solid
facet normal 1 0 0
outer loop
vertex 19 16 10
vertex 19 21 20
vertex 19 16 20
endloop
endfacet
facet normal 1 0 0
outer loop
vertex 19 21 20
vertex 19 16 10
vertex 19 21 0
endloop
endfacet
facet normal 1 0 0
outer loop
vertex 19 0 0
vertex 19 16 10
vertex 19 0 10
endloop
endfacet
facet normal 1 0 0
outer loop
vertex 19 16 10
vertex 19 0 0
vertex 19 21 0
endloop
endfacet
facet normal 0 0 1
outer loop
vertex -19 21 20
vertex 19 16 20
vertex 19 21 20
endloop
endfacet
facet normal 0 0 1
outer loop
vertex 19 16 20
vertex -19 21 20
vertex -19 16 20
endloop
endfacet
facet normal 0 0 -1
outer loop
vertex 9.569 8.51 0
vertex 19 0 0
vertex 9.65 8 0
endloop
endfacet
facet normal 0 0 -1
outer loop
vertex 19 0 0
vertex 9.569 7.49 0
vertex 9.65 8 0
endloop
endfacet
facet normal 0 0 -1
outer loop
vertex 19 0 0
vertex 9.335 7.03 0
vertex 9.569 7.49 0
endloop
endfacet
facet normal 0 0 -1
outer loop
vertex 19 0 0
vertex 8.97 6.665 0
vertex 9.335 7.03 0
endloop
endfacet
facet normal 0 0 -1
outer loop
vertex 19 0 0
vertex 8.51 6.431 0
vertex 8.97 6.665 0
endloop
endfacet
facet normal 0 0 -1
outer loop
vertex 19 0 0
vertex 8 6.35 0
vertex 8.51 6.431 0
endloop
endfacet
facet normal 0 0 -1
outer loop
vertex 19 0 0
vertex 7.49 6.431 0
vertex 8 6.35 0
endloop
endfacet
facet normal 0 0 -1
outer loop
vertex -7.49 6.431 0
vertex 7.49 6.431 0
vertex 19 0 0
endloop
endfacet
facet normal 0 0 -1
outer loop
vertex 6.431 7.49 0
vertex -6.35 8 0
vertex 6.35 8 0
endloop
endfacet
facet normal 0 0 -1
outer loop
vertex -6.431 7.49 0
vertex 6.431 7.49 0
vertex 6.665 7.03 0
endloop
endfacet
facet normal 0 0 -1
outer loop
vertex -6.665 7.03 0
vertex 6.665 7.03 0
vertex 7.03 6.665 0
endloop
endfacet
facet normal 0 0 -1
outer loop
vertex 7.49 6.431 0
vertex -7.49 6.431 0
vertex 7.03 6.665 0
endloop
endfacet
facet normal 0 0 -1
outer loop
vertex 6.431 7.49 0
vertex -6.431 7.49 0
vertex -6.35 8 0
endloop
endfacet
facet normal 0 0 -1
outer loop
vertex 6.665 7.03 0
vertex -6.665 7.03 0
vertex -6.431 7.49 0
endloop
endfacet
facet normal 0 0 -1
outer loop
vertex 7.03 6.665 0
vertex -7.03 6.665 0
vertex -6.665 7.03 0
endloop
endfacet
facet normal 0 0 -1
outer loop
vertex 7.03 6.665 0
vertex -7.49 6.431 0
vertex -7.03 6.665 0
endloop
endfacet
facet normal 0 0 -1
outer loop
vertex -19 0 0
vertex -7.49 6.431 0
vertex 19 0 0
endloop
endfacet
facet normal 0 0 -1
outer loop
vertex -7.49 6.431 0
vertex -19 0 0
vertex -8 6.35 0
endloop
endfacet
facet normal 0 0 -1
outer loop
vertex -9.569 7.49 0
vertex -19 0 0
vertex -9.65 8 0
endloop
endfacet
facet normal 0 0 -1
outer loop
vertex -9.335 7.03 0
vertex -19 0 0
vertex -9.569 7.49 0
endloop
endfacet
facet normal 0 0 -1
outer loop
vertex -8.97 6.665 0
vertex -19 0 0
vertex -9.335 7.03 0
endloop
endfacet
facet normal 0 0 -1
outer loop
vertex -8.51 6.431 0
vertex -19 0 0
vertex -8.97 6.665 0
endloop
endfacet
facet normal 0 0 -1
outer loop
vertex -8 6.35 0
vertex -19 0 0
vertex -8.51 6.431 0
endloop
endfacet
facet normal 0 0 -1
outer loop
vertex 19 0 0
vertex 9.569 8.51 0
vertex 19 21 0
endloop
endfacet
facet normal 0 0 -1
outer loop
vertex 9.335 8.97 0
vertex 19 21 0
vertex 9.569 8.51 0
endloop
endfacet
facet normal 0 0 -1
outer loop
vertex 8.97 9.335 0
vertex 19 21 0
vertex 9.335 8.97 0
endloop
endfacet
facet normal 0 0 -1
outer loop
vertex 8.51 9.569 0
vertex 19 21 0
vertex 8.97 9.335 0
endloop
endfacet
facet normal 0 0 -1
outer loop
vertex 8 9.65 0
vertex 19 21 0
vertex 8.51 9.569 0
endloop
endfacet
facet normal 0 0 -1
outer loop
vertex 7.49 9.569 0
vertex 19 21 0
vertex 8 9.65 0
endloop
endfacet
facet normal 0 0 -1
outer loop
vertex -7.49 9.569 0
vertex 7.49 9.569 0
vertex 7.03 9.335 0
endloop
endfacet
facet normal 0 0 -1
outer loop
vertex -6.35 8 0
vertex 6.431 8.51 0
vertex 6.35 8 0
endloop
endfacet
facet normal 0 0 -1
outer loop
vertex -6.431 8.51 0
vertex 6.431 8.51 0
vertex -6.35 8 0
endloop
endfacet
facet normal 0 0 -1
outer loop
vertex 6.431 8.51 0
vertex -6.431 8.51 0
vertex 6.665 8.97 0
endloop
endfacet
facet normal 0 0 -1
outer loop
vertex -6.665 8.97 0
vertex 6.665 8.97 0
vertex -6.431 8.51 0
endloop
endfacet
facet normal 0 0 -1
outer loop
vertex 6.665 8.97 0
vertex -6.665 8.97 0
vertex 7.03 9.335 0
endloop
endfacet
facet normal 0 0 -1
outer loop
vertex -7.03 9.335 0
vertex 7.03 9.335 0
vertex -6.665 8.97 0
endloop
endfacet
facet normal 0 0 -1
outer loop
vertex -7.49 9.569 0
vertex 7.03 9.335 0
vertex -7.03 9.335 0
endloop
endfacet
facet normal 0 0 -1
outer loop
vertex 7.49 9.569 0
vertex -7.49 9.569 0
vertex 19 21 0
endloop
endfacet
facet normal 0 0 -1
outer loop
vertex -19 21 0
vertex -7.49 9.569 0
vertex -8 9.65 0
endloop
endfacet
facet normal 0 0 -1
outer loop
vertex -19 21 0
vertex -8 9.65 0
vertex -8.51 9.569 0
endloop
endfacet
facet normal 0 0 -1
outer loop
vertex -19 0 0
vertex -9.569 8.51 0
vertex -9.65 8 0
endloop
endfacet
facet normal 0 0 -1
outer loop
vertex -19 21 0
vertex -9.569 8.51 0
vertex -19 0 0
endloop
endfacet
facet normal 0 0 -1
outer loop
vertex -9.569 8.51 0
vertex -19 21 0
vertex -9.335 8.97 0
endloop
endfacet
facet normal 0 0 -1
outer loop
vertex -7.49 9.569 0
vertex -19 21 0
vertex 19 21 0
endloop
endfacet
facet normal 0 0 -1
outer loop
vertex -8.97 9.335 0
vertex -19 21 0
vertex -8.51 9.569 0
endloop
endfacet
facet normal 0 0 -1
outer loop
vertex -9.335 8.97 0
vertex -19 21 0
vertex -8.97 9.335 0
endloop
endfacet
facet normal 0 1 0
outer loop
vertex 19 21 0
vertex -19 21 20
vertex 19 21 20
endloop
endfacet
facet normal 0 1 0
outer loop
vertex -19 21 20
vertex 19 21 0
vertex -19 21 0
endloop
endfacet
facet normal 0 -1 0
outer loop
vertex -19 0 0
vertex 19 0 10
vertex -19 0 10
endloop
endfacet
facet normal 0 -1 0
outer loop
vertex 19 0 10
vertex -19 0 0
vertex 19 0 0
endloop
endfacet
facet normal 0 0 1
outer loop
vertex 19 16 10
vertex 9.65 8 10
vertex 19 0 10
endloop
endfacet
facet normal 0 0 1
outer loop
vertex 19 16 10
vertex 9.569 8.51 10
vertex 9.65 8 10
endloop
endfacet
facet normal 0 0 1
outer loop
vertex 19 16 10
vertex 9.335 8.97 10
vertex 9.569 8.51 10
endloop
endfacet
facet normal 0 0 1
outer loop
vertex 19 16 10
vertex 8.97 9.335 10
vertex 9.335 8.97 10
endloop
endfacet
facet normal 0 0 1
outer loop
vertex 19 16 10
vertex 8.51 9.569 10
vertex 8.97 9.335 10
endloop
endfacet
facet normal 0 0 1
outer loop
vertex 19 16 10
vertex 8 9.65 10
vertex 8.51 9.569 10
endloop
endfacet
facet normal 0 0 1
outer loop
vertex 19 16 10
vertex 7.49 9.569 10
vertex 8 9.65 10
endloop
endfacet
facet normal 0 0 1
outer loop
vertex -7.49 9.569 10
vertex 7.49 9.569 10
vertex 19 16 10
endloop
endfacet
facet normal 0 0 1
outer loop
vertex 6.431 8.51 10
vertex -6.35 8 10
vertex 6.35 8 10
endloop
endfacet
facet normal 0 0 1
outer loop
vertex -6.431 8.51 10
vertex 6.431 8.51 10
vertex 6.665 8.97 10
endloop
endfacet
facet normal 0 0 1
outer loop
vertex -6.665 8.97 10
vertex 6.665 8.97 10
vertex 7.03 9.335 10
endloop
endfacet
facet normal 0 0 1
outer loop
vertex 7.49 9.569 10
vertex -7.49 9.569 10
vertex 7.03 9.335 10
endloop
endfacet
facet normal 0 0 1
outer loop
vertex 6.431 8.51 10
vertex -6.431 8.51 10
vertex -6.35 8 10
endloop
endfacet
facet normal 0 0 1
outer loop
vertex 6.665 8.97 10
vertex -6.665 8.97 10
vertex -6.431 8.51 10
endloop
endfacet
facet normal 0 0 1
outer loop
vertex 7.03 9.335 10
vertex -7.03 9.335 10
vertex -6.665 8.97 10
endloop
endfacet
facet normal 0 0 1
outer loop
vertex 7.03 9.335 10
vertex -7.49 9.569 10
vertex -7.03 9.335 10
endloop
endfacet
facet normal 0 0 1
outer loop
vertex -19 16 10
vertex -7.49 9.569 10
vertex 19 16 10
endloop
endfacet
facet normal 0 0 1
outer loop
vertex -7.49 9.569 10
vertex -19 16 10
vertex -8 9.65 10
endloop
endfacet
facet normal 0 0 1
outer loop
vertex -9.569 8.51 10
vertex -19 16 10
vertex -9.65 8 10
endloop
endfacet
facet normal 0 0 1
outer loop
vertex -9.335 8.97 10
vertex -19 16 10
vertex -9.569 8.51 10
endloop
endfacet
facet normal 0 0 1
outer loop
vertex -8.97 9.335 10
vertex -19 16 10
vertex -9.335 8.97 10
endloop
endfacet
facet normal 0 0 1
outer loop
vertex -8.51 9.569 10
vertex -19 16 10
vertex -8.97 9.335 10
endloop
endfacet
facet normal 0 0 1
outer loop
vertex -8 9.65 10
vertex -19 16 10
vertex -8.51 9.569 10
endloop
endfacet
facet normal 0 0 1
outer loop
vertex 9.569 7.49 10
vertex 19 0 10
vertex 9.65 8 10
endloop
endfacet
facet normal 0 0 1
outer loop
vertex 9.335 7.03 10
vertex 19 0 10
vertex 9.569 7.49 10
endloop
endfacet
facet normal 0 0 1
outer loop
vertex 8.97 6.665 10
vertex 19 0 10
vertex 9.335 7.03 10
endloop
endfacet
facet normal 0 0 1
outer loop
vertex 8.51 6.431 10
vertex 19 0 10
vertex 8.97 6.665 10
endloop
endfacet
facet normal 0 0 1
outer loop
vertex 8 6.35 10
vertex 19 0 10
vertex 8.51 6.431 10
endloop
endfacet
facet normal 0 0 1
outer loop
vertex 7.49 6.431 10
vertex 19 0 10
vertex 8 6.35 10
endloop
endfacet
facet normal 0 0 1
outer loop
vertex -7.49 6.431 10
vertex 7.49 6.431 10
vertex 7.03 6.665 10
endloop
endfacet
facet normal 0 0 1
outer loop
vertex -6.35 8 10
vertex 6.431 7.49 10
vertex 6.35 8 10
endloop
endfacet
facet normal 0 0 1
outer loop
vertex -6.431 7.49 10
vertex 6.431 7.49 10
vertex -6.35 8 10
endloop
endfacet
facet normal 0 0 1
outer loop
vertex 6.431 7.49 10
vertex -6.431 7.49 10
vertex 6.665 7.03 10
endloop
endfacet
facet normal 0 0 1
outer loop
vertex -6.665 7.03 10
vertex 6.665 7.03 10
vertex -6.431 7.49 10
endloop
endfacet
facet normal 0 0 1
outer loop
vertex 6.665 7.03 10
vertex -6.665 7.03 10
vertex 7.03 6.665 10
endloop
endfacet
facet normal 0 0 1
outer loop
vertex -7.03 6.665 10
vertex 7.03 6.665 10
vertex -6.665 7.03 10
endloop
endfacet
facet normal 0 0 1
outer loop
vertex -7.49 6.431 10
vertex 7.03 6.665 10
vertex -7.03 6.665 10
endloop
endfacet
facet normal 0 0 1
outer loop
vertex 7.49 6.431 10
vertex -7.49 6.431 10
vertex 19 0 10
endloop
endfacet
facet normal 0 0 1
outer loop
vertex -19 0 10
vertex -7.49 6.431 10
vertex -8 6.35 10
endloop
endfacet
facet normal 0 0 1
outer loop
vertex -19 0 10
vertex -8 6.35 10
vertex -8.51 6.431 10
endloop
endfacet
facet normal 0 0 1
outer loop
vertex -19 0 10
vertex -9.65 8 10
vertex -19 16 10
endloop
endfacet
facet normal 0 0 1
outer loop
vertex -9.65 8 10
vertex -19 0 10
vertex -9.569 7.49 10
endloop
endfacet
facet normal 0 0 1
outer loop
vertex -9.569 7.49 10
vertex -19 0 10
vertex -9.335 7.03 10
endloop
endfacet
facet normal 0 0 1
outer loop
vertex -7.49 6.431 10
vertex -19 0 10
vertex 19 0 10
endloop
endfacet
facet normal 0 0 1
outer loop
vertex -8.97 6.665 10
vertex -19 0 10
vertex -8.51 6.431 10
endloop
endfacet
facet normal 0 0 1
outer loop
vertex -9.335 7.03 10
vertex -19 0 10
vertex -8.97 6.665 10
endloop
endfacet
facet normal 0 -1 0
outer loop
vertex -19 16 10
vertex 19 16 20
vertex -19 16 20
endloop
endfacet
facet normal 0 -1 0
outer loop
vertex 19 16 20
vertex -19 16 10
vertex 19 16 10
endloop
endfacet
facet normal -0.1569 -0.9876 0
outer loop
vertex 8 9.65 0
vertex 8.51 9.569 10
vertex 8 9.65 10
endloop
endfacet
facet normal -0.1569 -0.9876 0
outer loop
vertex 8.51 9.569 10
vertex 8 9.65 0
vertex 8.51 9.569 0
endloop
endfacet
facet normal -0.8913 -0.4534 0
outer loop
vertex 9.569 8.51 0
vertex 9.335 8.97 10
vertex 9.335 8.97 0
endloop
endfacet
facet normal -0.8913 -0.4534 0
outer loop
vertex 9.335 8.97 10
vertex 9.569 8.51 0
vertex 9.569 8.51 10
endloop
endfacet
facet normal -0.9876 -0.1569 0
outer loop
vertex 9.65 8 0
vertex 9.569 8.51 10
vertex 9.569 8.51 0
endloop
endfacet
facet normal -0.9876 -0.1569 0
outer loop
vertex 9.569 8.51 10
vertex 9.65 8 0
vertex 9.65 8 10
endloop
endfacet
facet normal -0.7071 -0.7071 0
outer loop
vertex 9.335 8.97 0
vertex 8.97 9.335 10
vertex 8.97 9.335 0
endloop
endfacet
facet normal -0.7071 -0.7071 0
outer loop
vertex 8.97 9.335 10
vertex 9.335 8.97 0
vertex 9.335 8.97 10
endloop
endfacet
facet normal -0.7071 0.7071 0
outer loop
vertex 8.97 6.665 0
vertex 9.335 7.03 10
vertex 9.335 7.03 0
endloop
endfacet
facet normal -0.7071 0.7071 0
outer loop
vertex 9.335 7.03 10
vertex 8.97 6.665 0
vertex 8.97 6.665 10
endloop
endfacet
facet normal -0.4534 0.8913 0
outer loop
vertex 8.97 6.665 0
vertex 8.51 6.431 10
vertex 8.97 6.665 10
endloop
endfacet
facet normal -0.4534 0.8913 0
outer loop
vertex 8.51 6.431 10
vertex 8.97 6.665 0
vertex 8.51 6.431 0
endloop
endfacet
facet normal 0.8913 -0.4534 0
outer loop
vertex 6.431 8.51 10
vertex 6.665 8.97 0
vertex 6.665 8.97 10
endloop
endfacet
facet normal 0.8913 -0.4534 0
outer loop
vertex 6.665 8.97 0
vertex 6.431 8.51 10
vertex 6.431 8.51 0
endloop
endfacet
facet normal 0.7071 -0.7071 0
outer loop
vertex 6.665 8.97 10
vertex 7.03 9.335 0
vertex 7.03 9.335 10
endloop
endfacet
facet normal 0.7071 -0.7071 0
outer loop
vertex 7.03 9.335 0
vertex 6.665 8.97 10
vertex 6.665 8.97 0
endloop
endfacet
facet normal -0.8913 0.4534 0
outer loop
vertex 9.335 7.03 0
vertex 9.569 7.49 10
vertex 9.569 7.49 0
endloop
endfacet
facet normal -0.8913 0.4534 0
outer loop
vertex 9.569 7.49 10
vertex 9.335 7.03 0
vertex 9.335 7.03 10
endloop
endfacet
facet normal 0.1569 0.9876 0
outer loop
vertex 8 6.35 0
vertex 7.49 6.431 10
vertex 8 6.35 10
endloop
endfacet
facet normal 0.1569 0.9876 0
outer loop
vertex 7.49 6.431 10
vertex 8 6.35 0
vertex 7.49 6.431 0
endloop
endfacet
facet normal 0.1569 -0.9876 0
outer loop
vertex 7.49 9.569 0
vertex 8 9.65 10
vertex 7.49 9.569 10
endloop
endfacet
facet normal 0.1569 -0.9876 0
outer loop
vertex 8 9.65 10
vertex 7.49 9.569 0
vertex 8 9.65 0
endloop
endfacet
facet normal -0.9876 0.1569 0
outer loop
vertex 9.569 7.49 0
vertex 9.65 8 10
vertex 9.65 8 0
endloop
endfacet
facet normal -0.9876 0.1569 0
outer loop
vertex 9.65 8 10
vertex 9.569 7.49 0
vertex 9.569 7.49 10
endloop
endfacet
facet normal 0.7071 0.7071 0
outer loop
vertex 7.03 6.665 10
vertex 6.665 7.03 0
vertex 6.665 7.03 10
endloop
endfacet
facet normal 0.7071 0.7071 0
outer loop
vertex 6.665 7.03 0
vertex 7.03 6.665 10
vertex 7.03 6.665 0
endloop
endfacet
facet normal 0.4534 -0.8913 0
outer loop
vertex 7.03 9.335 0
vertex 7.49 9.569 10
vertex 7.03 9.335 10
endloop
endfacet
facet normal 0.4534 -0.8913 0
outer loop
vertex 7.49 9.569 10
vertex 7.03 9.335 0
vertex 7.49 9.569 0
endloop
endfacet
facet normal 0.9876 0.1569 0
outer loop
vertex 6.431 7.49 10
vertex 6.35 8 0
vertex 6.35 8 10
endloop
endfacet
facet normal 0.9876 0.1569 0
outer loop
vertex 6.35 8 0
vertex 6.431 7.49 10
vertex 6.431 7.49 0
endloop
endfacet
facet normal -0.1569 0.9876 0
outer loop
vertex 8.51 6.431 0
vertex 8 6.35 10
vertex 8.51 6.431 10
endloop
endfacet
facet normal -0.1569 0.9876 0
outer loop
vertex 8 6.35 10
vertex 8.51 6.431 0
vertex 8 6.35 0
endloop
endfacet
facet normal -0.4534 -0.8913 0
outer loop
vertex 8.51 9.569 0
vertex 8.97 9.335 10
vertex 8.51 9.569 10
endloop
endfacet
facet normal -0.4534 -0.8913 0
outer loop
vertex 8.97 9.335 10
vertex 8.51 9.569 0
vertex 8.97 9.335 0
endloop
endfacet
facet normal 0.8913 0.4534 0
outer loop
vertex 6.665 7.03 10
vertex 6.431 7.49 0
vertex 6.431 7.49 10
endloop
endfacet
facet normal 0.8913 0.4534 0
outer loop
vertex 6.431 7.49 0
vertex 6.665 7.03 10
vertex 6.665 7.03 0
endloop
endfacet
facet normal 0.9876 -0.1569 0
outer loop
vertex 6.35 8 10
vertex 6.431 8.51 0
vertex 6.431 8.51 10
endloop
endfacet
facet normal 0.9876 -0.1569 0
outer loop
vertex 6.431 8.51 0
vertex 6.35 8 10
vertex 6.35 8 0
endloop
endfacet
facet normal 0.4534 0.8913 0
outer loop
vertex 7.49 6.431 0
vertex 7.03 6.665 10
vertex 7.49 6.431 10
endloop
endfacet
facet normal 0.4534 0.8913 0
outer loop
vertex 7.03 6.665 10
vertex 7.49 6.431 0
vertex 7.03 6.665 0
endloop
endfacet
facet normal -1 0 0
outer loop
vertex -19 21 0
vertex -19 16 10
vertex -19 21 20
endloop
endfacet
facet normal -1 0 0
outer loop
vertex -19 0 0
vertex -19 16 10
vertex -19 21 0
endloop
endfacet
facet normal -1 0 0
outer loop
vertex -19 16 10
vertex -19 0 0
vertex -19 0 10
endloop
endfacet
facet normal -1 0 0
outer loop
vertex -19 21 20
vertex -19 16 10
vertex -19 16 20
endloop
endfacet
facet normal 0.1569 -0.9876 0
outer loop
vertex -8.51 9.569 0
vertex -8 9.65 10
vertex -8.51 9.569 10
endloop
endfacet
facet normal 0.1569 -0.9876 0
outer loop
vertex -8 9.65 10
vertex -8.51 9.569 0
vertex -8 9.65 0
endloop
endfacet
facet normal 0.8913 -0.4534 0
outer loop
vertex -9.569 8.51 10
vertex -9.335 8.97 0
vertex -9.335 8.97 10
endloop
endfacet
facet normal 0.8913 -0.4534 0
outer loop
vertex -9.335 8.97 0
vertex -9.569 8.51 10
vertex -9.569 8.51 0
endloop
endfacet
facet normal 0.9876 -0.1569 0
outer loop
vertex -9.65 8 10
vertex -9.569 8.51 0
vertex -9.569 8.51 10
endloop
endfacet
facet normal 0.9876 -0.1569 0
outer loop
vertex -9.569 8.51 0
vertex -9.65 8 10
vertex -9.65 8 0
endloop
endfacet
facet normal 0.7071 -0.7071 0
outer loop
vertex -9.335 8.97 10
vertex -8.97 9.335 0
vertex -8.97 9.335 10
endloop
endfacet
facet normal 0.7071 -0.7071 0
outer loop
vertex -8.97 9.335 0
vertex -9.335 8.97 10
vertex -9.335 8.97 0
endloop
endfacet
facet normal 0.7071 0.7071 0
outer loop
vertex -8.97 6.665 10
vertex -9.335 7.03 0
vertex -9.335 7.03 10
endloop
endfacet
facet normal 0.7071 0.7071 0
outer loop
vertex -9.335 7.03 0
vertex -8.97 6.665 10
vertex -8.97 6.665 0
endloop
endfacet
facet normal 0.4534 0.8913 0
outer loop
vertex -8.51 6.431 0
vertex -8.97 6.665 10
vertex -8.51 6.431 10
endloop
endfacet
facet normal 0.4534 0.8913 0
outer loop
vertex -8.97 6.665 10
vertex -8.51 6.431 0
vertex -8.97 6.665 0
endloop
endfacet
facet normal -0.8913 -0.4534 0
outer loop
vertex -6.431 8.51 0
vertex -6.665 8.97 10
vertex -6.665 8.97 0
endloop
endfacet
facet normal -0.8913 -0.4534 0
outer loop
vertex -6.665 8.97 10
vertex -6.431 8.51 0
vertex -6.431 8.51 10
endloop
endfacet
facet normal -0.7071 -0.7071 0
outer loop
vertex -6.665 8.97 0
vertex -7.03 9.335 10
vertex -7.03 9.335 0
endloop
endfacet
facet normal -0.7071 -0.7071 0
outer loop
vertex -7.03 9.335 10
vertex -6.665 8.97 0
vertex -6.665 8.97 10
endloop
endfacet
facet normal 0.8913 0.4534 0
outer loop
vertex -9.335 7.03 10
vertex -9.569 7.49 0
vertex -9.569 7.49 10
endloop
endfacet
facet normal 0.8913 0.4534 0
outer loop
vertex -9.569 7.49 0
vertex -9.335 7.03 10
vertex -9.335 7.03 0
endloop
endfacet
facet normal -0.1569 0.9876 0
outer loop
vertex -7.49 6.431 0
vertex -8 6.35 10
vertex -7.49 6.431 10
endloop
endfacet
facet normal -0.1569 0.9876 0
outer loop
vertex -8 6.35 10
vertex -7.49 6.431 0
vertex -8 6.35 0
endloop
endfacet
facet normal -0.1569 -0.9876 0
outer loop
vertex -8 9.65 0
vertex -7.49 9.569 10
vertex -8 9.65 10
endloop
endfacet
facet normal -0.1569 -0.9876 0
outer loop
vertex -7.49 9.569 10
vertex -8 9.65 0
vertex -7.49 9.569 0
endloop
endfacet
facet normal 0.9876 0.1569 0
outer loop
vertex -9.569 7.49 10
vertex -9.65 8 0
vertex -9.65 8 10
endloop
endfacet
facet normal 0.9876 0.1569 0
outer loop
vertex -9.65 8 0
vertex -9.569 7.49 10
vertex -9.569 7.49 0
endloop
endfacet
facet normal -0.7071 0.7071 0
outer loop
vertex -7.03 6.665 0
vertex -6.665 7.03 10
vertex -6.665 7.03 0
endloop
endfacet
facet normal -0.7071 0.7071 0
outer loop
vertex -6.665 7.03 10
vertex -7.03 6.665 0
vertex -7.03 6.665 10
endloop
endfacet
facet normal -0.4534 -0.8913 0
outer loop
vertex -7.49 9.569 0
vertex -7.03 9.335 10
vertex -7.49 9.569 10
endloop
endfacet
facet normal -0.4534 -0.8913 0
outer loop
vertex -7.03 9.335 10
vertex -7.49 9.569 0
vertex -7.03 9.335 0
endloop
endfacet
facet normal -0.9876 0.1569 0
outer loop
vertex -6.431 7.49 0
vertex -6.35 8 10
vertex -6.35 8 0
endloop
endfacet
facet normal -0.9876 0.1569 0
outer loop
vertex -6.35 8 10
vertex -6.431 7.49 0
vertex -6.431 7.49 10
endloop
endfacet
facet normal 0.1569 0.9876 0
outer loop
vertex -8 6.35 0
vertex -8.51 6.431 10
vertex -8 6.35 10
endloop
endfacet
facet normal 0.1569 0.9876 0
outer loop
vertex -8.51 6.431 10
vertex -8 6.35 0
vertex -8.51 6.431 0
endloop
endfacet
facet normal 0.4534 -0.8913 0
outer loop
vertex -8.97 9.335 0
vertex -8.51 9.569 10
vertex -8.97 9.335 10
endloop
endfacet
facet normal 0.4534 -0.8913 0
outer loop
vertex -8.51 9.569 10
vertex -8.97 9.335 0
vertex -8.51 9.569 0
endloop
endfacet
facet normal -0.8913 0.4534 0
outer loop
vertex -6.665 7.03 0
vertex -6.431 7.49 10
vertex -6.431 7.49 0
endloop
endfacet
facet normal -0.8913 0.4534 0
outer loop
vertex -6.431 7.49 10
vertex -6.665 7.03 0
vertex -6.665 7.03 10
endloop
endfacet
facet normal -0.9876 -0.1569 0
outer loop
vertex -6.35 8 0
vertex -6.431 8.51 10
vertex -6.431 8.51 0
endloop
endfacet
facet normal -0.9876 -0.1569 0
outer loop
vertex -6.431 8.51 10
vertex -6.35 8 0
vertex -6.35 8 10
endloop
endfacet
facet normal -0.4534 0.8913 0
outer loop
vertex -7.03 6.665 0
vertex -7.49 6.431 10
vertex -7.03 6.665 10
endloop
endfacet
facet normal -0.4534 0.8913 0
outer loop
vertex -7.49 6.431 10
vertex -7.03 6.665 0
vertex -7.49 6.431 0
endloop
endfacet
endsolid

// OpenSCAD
$fn = 20;

screw_left = 8;
screw_down = 8;
screw_inner = 3.3;
screw_outer = 6;
screw_height = 10;

base_height = 4;
border_height = 20;
border_width = 5;

module content(){
	difference(){
		union(){
			cube([screw_left + screw_outer + border_width, 2 * screw_down + border_width, border_height]);
			translate([screw_left, screw_down, 0]) cylinder(h = screw_height, d = screw_outer);
		}
		translate([0, 0, screw_height]) cube([screw_left + screw_outer + border_width, 2 * screw_down, screw_height]);
		translate([screw_left, screw_down, 0]) cylinder(h = screw_height, d = screw_inner);
	}
}

union(){
	union(){
		content();
		mirror([1, 0, 0]) content();
	}
}
